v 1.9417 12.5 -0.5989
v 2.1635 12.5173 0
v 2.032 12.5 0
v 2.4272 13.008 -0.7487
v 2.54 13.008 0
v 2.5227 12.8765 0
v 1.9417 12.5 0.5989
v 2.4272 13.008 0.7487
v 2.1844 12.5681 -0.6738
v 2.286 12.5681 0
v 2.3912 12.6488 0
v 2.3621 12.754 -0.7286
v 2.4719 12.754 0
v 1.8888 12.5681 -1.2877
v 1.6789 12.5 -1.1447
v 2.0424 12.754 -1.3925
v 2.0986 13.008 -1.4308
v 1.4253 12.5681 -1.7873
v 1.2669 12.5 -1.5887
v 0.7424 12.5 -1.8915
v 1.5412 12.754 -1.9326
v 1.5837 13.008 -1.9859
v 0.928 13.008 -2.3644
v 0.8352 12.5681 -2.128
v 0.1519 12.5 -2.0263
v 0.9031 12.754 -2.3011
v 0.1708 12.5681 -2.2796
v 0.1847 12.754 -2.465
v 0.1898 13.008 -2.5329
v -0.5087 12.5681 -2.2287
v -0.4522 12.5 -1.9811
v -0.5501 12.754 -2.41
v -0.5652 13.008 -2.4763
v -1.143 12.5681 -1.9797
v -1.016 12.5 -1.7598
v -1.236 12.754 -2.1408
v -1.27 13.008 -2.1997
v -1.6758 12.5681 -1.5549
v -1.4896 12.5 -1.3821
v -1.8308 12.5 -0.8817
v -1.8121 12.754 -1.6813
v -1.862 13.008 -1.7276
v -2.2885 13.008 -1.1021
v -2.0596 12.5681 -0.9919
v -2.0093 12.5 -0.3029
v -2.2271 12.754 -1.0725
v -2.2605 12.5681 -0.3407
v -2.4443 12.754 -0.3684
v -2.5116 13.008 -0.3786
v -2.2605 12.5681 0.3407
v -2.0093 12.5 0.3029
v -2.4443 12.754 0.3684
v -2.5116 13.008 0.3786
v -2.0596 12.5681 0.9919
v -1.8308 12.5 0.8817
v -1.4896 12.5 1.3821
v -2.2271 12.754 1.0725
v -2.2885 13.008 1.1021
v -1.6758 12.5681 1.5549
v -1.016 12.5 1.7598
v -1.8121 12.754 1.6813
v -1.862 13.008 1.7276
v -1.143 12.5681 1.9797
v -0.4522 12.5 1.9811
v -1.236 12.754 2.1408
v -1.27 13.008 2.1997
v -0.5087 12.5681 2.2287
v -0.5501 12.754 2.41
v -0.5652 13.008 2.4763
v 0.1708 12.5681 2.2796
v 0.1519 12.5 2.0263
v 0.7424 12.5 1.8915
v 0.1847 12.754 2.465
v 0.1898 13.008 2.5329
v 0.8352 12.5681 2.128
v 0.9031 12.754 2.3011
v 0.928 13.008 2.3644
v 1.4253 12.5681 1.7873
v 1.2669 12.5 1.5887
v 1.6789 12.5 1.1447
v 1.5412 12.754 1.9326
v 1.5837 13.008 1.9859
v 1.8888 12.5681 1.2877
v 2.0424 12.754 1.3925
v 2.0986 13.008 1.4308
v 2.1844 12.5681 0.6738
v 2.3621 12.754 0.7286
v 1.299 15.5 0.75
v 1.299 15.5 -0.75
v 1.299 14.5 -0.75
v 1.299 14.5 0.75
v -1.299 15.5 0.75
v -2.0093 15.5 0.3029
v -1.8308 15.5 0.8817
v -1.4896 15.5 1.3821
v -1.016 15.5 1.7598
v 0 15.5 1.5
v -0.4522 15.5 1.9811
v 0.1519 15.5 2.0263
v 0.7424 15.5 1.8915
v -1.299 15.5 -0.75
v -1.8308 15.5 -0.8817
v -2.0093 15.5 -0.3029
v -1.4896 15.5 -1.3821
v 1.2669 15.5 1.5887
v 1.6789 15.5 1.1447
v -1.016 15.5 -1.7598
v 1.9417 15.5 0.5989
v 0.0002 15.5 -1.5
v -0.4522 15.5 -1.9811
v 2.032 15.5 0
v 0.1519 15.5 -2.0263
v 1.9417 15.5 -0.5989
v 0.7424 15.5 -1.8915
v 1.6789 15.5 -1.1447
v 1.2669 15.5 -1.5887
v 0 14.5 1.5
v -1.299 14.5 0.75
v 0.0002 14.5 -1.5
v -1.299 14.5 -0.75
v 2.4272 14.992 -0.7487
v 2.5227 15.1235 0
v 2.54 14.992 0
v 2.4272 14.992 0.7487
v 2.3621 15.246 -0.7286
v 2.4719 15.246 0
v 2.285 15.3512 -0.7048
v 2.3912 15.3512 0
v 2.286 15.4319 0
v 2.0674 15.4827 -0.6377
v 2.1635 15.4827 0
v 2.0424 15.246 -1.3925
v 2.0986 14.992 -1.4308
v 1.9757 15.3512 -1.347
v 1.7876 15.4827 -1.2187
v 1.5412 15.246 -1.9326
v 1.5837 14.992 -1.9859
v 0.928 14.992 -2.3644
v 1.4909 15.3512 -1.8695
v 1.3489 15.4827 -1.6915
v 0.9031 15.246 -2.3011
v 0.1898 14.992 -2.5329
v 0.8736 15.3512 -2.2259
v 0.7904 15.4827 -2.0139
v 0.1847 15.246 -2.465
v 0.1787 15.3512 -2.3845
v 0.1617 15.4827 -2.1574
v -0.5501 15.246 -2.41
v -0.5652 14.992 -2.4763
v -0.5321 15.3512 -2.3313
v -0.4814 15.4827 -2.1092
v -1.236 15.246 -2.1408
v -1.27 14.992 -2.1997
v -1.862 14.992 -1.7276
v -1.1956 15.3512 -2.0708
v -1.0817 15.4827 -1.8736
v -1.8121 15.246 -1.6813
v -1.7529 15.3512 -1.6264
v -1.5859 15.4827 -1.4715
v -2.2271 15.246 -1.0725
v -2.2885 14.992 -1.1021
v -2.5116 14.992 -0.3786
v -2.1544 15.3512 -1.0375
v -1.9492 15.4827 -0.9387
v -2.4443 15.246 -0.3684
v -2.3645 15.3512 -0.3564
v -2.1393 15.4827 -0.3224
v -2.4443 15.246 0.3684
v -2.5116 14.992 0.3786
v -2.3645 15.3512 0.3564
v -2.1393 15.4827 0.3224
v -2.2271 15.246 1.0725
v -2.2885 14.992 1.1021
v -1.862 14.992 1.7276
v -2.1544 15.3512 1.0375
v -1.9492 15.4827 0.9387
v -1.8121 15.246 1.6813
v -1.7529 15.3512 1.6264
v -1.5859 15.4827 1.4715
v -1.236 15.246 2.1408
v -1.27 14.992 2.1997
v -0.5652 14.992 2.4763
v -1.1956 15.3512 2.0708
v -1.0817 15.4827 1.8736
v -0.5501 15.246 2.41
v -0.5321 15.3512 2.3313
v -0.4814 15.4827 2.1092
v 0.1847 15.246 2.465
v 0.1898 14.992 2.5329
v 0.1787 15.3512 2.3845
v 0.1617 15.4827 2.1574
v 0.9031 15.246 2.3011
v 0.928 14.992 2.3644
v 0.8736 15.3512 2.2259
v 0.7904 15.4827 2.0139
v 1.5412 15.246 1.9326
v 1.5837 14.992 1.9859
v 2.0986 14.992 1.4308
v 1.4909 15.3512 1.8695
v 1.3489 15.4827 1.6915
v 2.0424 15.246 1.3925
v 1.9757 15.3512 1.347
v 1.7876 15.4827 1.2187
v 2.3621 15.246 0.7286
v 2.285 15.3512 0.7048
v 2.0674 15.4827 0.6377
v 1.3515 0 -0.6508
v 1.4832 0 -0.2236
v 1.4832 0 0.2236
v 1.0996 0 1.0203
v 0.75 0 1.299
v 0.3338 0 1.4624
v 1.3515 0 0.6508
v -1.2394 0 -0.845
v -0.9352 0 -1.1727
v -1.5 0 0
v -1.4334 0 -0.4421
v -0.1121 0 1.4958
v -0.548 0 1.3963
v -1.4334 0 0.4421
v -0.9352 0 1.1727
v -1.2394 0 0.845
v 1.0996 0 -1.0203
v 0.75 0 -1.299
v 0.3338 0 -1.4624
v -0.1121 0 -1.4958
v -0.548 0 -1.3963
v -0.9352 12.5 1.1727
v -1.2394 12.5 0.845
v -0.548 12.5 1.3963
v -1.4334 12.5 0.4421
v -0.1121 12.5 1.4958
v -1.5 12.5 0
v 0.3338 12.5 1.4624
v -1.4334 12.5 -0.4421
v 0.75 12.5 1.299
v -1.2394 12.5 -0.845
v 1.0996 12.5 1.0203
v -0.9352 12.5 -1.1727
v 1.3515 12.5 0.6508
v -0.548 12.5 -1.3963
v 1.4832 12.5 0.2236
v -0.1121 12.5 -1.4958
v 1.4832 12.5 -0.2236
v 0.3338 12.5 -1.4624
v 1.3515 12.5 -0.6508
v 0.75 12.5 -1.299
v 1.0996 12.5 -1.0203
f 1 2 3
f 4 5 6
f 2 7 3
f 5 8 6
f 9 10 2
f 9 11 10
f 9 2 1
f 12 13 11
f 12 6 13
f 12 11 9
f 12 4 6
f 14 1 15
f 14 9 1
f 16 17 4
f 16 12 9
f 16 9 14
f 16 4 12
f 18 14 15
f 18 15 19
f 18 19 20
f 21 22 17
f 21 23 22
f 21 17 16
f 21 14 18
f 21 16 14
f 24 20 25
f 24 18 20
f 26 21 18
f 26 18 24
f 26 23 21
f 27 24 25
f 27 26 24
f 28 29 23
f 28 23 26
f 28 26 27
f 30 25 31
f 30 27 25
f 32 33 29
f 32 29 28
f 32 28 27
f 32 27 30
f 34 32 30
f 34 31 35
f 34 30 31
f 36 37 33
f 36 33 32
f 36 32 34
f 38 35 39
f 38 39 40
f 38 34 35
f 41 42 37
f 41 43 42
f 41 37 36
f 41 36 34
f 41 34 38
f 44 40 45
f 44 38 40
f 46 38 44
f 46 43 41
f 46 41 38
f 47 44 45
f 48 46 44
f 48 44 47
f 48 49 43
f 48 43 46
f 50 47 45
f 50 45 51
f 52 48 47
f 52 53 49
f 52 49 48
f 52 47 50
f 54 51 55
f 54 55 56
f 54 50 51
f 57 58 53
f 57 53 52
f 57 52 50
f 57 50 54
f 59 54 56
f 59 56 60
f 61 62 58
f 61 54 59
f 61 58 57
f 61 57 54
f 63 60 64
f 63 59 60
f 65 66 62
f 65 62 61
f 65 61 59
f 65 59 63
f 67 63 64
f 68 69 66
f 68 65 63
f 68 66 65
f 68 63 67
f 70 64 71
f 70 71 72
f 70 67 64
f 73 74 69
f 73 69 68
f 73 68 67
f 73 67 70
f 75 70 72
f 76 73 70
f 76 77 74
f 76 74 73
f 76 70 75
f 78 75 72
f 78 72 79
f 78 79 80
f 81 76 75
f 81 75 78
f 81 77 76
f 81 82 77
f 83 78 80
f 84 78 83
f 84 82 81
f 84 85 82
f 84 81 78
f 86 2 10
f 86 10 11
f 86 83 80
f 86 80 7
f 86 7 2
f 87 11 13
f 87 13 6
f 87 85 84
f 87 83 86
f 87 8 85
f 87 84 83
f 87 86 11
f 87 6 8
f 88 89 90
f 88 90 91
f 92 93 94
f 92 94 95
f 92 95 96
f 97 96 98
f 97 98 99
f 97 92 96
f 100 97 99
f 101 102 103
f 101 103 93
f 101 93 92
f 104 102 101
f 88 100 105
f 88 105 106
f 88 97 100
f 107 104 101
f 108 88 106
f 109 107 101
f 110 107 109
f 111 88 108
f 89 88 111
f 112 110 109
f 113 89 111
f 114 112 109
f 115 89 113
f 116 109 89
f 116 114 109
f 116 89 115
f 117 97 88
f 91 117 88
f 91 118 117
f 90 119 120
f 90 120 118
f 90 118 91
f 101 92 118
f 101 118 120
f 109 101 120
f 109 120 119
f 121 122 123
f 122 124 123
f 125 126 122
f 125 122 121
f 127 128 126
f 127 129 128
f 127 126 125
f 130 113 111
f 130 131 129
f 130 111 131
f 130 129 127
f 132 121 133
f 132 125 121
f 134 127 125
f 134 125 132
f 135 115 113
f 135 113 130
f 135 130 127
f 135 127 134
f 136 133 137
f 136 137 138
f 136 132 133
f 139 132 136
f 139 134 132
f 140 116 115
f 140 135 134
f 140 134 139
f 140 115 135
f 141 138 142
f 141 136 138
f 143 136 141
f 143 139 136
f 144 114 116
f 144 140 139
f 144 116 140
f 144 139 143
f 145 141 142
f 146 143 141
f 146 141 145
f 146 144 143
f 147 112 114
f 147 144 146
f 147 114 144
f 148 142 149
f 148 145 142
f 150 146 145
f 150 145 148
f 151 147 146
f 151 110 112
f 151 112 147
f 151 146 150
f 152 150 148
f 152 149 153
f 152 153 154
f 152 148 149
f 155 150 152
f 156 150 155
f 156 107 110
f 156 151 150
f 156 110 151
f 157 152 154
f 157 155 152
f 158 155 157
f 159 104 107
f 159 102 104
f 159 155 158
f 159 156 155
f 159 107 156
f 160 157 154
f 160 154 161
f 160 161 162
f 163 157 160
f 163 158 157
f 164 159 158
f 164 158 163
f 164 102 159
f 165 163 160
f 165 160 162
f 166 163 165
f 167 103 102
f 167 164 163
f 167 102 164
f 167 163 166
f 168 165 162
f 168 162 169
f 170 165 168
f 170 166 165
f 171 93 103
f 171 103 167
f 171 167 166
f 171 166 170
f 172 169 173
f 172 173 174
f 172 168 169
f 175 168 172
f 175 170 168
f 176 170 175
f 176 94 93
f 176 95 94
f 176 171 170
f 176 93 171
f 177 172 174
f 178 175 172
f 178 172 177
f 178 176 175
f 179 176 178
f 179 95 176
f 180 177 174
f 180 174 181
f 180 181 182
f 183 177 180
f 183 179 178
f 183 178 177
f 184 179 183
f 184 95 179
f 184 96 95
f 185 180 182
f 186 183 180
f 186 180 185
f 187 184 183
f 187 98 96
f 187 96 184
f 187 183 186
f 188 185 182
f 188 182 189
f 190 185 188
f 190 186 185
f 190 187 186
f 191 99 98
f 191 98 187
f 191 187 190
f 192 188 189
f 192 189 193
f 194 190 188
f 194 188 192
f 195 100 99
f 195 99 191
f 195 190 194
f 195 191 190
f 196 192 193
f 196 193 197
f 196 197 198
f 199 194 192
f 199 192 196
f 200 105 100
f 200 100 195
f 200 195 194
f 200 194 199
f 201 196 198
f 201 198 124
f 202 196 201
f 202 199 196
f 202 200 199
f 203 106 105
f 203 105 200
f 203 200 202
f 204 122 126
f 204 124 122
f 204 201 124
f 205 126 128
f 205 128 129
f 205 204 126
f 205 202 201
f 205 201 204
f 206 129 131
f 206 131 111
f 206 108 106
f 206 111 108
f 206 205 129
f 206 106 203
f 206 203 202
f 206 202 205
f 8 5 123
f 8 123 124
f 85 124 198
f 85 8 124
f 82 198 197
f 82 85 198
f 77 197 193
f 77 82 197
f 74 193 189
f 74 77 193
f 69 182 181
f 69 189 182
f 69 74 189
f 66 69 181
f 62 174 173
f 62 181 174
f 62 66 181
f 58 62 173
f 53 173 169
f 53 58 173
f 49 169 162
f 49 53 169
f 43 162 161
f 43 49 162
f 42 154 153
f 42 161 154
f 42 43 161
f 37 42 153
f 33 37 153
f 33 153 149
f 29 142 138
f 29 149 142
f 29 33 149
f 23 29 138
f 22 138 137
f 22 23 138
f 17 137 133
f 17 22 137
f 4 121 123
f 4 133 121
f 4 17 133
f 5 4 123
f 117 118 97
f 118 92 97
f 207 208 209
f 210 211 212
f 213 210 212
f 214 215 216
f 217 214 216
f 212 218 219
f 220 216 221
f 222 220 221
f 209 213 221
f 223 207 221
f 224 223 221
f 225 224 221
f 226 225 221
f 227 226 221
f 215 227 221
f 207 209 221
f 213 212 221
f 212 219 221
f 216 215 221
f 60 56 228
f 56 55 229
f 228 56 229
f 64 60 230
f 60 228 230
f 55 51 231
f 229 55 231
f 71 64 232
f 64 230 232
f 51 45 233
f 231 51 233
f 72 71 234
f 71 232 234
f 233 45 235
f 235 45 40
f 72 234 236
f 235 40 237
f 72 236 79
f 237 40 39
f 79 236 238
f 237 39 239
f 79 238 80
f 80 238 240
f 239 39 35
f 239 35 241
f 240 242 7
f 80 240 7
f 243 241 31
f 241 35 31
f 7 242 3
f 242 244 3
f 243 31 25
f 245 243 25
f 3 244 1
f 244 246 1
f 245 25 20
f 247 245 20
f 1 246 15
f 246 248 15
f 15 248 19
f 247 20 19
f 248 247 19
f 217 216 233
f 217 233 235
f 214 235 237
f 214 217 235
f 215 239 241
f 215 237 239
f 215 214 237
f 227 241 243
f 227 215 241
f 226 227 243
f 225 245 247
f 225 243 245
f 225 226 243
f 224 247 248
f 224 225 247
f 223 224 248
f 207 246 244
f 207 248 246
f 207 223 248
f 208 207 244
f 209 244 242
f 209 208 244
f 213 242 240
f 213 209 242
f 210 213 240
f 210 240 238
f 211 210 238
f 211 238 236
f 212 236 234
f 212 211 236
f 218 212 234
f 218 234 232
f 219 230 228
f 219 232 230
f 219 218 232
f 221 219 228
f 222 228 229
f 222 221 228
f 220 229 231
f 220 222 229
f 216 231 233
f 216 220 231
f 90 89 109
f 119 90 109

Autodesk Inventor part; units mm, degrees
ref_plane "YZ Plane" through (0, 0, 0) normal (1, 0, 0) x (0, 1, 0)
ref_plane "XZ Plane" through (0, 0, 0) normal (0, 1, 0) x (-1, 0, 0)
ref_plane "XY Plane" through (0, 0, 0) normal (0, 0, 1) x (1, 0, 0)
sketch "Sketch1" plane through (0, 0, 0) normal (0, 1, 0) x (-1, 0, 0)
  circle A0 centre (0, 0) radius 1.5
  dimension "d0" = 3
extrude "Extrusion1" add sketch "Sketch1" along normal blind 12.5
sketch "Sketch2" plane through (0, 12.5, 0) normal (0, 1, 0) x (1, 0, 0)
  circle A0 centre (0, 0) radius 1.5 projected
  circle A1 centre (0, 0) radius 2.54
  dimension "d3" = 5.08
extrude "Extrusion2" add sketch "Sketch2" along normal blind 3 contours A0 | A1
fillet "Fillet1" radius 0.508 2 edges at (-2.54, 15.5, 0) (-2.54, 12.5, 0)
sketch "Sketch3" plane through (0, 15.5, 0) normal (0, 1, 0) x (1, 0, 0)
  line L0 (0, 0) -> (1.5, 0) construction
  line L1 (-1.299, -0.75) -> (-1.299, 0.75)
  line L2 (-1.299, 0.75) -> (0.0002, 1.5)
  line L3 (1.299, 0.75) -> (0.0002, 1.5)
  line L4 (1.299, 0.75) -> (1.299, -0.75)
  line L5 (0, -1.5) -> (1.299, -0.75)
  line L6 (-1.299, -0.75) -> (0, -1.5)
thread "Thread1" size "5-40 UNC" class "2A" standard "ANSI Unified Screw Threads" full length
extrude "Extrusion4" cut sketch "Sketch3" against normal blind 1
properties part number "screw"
